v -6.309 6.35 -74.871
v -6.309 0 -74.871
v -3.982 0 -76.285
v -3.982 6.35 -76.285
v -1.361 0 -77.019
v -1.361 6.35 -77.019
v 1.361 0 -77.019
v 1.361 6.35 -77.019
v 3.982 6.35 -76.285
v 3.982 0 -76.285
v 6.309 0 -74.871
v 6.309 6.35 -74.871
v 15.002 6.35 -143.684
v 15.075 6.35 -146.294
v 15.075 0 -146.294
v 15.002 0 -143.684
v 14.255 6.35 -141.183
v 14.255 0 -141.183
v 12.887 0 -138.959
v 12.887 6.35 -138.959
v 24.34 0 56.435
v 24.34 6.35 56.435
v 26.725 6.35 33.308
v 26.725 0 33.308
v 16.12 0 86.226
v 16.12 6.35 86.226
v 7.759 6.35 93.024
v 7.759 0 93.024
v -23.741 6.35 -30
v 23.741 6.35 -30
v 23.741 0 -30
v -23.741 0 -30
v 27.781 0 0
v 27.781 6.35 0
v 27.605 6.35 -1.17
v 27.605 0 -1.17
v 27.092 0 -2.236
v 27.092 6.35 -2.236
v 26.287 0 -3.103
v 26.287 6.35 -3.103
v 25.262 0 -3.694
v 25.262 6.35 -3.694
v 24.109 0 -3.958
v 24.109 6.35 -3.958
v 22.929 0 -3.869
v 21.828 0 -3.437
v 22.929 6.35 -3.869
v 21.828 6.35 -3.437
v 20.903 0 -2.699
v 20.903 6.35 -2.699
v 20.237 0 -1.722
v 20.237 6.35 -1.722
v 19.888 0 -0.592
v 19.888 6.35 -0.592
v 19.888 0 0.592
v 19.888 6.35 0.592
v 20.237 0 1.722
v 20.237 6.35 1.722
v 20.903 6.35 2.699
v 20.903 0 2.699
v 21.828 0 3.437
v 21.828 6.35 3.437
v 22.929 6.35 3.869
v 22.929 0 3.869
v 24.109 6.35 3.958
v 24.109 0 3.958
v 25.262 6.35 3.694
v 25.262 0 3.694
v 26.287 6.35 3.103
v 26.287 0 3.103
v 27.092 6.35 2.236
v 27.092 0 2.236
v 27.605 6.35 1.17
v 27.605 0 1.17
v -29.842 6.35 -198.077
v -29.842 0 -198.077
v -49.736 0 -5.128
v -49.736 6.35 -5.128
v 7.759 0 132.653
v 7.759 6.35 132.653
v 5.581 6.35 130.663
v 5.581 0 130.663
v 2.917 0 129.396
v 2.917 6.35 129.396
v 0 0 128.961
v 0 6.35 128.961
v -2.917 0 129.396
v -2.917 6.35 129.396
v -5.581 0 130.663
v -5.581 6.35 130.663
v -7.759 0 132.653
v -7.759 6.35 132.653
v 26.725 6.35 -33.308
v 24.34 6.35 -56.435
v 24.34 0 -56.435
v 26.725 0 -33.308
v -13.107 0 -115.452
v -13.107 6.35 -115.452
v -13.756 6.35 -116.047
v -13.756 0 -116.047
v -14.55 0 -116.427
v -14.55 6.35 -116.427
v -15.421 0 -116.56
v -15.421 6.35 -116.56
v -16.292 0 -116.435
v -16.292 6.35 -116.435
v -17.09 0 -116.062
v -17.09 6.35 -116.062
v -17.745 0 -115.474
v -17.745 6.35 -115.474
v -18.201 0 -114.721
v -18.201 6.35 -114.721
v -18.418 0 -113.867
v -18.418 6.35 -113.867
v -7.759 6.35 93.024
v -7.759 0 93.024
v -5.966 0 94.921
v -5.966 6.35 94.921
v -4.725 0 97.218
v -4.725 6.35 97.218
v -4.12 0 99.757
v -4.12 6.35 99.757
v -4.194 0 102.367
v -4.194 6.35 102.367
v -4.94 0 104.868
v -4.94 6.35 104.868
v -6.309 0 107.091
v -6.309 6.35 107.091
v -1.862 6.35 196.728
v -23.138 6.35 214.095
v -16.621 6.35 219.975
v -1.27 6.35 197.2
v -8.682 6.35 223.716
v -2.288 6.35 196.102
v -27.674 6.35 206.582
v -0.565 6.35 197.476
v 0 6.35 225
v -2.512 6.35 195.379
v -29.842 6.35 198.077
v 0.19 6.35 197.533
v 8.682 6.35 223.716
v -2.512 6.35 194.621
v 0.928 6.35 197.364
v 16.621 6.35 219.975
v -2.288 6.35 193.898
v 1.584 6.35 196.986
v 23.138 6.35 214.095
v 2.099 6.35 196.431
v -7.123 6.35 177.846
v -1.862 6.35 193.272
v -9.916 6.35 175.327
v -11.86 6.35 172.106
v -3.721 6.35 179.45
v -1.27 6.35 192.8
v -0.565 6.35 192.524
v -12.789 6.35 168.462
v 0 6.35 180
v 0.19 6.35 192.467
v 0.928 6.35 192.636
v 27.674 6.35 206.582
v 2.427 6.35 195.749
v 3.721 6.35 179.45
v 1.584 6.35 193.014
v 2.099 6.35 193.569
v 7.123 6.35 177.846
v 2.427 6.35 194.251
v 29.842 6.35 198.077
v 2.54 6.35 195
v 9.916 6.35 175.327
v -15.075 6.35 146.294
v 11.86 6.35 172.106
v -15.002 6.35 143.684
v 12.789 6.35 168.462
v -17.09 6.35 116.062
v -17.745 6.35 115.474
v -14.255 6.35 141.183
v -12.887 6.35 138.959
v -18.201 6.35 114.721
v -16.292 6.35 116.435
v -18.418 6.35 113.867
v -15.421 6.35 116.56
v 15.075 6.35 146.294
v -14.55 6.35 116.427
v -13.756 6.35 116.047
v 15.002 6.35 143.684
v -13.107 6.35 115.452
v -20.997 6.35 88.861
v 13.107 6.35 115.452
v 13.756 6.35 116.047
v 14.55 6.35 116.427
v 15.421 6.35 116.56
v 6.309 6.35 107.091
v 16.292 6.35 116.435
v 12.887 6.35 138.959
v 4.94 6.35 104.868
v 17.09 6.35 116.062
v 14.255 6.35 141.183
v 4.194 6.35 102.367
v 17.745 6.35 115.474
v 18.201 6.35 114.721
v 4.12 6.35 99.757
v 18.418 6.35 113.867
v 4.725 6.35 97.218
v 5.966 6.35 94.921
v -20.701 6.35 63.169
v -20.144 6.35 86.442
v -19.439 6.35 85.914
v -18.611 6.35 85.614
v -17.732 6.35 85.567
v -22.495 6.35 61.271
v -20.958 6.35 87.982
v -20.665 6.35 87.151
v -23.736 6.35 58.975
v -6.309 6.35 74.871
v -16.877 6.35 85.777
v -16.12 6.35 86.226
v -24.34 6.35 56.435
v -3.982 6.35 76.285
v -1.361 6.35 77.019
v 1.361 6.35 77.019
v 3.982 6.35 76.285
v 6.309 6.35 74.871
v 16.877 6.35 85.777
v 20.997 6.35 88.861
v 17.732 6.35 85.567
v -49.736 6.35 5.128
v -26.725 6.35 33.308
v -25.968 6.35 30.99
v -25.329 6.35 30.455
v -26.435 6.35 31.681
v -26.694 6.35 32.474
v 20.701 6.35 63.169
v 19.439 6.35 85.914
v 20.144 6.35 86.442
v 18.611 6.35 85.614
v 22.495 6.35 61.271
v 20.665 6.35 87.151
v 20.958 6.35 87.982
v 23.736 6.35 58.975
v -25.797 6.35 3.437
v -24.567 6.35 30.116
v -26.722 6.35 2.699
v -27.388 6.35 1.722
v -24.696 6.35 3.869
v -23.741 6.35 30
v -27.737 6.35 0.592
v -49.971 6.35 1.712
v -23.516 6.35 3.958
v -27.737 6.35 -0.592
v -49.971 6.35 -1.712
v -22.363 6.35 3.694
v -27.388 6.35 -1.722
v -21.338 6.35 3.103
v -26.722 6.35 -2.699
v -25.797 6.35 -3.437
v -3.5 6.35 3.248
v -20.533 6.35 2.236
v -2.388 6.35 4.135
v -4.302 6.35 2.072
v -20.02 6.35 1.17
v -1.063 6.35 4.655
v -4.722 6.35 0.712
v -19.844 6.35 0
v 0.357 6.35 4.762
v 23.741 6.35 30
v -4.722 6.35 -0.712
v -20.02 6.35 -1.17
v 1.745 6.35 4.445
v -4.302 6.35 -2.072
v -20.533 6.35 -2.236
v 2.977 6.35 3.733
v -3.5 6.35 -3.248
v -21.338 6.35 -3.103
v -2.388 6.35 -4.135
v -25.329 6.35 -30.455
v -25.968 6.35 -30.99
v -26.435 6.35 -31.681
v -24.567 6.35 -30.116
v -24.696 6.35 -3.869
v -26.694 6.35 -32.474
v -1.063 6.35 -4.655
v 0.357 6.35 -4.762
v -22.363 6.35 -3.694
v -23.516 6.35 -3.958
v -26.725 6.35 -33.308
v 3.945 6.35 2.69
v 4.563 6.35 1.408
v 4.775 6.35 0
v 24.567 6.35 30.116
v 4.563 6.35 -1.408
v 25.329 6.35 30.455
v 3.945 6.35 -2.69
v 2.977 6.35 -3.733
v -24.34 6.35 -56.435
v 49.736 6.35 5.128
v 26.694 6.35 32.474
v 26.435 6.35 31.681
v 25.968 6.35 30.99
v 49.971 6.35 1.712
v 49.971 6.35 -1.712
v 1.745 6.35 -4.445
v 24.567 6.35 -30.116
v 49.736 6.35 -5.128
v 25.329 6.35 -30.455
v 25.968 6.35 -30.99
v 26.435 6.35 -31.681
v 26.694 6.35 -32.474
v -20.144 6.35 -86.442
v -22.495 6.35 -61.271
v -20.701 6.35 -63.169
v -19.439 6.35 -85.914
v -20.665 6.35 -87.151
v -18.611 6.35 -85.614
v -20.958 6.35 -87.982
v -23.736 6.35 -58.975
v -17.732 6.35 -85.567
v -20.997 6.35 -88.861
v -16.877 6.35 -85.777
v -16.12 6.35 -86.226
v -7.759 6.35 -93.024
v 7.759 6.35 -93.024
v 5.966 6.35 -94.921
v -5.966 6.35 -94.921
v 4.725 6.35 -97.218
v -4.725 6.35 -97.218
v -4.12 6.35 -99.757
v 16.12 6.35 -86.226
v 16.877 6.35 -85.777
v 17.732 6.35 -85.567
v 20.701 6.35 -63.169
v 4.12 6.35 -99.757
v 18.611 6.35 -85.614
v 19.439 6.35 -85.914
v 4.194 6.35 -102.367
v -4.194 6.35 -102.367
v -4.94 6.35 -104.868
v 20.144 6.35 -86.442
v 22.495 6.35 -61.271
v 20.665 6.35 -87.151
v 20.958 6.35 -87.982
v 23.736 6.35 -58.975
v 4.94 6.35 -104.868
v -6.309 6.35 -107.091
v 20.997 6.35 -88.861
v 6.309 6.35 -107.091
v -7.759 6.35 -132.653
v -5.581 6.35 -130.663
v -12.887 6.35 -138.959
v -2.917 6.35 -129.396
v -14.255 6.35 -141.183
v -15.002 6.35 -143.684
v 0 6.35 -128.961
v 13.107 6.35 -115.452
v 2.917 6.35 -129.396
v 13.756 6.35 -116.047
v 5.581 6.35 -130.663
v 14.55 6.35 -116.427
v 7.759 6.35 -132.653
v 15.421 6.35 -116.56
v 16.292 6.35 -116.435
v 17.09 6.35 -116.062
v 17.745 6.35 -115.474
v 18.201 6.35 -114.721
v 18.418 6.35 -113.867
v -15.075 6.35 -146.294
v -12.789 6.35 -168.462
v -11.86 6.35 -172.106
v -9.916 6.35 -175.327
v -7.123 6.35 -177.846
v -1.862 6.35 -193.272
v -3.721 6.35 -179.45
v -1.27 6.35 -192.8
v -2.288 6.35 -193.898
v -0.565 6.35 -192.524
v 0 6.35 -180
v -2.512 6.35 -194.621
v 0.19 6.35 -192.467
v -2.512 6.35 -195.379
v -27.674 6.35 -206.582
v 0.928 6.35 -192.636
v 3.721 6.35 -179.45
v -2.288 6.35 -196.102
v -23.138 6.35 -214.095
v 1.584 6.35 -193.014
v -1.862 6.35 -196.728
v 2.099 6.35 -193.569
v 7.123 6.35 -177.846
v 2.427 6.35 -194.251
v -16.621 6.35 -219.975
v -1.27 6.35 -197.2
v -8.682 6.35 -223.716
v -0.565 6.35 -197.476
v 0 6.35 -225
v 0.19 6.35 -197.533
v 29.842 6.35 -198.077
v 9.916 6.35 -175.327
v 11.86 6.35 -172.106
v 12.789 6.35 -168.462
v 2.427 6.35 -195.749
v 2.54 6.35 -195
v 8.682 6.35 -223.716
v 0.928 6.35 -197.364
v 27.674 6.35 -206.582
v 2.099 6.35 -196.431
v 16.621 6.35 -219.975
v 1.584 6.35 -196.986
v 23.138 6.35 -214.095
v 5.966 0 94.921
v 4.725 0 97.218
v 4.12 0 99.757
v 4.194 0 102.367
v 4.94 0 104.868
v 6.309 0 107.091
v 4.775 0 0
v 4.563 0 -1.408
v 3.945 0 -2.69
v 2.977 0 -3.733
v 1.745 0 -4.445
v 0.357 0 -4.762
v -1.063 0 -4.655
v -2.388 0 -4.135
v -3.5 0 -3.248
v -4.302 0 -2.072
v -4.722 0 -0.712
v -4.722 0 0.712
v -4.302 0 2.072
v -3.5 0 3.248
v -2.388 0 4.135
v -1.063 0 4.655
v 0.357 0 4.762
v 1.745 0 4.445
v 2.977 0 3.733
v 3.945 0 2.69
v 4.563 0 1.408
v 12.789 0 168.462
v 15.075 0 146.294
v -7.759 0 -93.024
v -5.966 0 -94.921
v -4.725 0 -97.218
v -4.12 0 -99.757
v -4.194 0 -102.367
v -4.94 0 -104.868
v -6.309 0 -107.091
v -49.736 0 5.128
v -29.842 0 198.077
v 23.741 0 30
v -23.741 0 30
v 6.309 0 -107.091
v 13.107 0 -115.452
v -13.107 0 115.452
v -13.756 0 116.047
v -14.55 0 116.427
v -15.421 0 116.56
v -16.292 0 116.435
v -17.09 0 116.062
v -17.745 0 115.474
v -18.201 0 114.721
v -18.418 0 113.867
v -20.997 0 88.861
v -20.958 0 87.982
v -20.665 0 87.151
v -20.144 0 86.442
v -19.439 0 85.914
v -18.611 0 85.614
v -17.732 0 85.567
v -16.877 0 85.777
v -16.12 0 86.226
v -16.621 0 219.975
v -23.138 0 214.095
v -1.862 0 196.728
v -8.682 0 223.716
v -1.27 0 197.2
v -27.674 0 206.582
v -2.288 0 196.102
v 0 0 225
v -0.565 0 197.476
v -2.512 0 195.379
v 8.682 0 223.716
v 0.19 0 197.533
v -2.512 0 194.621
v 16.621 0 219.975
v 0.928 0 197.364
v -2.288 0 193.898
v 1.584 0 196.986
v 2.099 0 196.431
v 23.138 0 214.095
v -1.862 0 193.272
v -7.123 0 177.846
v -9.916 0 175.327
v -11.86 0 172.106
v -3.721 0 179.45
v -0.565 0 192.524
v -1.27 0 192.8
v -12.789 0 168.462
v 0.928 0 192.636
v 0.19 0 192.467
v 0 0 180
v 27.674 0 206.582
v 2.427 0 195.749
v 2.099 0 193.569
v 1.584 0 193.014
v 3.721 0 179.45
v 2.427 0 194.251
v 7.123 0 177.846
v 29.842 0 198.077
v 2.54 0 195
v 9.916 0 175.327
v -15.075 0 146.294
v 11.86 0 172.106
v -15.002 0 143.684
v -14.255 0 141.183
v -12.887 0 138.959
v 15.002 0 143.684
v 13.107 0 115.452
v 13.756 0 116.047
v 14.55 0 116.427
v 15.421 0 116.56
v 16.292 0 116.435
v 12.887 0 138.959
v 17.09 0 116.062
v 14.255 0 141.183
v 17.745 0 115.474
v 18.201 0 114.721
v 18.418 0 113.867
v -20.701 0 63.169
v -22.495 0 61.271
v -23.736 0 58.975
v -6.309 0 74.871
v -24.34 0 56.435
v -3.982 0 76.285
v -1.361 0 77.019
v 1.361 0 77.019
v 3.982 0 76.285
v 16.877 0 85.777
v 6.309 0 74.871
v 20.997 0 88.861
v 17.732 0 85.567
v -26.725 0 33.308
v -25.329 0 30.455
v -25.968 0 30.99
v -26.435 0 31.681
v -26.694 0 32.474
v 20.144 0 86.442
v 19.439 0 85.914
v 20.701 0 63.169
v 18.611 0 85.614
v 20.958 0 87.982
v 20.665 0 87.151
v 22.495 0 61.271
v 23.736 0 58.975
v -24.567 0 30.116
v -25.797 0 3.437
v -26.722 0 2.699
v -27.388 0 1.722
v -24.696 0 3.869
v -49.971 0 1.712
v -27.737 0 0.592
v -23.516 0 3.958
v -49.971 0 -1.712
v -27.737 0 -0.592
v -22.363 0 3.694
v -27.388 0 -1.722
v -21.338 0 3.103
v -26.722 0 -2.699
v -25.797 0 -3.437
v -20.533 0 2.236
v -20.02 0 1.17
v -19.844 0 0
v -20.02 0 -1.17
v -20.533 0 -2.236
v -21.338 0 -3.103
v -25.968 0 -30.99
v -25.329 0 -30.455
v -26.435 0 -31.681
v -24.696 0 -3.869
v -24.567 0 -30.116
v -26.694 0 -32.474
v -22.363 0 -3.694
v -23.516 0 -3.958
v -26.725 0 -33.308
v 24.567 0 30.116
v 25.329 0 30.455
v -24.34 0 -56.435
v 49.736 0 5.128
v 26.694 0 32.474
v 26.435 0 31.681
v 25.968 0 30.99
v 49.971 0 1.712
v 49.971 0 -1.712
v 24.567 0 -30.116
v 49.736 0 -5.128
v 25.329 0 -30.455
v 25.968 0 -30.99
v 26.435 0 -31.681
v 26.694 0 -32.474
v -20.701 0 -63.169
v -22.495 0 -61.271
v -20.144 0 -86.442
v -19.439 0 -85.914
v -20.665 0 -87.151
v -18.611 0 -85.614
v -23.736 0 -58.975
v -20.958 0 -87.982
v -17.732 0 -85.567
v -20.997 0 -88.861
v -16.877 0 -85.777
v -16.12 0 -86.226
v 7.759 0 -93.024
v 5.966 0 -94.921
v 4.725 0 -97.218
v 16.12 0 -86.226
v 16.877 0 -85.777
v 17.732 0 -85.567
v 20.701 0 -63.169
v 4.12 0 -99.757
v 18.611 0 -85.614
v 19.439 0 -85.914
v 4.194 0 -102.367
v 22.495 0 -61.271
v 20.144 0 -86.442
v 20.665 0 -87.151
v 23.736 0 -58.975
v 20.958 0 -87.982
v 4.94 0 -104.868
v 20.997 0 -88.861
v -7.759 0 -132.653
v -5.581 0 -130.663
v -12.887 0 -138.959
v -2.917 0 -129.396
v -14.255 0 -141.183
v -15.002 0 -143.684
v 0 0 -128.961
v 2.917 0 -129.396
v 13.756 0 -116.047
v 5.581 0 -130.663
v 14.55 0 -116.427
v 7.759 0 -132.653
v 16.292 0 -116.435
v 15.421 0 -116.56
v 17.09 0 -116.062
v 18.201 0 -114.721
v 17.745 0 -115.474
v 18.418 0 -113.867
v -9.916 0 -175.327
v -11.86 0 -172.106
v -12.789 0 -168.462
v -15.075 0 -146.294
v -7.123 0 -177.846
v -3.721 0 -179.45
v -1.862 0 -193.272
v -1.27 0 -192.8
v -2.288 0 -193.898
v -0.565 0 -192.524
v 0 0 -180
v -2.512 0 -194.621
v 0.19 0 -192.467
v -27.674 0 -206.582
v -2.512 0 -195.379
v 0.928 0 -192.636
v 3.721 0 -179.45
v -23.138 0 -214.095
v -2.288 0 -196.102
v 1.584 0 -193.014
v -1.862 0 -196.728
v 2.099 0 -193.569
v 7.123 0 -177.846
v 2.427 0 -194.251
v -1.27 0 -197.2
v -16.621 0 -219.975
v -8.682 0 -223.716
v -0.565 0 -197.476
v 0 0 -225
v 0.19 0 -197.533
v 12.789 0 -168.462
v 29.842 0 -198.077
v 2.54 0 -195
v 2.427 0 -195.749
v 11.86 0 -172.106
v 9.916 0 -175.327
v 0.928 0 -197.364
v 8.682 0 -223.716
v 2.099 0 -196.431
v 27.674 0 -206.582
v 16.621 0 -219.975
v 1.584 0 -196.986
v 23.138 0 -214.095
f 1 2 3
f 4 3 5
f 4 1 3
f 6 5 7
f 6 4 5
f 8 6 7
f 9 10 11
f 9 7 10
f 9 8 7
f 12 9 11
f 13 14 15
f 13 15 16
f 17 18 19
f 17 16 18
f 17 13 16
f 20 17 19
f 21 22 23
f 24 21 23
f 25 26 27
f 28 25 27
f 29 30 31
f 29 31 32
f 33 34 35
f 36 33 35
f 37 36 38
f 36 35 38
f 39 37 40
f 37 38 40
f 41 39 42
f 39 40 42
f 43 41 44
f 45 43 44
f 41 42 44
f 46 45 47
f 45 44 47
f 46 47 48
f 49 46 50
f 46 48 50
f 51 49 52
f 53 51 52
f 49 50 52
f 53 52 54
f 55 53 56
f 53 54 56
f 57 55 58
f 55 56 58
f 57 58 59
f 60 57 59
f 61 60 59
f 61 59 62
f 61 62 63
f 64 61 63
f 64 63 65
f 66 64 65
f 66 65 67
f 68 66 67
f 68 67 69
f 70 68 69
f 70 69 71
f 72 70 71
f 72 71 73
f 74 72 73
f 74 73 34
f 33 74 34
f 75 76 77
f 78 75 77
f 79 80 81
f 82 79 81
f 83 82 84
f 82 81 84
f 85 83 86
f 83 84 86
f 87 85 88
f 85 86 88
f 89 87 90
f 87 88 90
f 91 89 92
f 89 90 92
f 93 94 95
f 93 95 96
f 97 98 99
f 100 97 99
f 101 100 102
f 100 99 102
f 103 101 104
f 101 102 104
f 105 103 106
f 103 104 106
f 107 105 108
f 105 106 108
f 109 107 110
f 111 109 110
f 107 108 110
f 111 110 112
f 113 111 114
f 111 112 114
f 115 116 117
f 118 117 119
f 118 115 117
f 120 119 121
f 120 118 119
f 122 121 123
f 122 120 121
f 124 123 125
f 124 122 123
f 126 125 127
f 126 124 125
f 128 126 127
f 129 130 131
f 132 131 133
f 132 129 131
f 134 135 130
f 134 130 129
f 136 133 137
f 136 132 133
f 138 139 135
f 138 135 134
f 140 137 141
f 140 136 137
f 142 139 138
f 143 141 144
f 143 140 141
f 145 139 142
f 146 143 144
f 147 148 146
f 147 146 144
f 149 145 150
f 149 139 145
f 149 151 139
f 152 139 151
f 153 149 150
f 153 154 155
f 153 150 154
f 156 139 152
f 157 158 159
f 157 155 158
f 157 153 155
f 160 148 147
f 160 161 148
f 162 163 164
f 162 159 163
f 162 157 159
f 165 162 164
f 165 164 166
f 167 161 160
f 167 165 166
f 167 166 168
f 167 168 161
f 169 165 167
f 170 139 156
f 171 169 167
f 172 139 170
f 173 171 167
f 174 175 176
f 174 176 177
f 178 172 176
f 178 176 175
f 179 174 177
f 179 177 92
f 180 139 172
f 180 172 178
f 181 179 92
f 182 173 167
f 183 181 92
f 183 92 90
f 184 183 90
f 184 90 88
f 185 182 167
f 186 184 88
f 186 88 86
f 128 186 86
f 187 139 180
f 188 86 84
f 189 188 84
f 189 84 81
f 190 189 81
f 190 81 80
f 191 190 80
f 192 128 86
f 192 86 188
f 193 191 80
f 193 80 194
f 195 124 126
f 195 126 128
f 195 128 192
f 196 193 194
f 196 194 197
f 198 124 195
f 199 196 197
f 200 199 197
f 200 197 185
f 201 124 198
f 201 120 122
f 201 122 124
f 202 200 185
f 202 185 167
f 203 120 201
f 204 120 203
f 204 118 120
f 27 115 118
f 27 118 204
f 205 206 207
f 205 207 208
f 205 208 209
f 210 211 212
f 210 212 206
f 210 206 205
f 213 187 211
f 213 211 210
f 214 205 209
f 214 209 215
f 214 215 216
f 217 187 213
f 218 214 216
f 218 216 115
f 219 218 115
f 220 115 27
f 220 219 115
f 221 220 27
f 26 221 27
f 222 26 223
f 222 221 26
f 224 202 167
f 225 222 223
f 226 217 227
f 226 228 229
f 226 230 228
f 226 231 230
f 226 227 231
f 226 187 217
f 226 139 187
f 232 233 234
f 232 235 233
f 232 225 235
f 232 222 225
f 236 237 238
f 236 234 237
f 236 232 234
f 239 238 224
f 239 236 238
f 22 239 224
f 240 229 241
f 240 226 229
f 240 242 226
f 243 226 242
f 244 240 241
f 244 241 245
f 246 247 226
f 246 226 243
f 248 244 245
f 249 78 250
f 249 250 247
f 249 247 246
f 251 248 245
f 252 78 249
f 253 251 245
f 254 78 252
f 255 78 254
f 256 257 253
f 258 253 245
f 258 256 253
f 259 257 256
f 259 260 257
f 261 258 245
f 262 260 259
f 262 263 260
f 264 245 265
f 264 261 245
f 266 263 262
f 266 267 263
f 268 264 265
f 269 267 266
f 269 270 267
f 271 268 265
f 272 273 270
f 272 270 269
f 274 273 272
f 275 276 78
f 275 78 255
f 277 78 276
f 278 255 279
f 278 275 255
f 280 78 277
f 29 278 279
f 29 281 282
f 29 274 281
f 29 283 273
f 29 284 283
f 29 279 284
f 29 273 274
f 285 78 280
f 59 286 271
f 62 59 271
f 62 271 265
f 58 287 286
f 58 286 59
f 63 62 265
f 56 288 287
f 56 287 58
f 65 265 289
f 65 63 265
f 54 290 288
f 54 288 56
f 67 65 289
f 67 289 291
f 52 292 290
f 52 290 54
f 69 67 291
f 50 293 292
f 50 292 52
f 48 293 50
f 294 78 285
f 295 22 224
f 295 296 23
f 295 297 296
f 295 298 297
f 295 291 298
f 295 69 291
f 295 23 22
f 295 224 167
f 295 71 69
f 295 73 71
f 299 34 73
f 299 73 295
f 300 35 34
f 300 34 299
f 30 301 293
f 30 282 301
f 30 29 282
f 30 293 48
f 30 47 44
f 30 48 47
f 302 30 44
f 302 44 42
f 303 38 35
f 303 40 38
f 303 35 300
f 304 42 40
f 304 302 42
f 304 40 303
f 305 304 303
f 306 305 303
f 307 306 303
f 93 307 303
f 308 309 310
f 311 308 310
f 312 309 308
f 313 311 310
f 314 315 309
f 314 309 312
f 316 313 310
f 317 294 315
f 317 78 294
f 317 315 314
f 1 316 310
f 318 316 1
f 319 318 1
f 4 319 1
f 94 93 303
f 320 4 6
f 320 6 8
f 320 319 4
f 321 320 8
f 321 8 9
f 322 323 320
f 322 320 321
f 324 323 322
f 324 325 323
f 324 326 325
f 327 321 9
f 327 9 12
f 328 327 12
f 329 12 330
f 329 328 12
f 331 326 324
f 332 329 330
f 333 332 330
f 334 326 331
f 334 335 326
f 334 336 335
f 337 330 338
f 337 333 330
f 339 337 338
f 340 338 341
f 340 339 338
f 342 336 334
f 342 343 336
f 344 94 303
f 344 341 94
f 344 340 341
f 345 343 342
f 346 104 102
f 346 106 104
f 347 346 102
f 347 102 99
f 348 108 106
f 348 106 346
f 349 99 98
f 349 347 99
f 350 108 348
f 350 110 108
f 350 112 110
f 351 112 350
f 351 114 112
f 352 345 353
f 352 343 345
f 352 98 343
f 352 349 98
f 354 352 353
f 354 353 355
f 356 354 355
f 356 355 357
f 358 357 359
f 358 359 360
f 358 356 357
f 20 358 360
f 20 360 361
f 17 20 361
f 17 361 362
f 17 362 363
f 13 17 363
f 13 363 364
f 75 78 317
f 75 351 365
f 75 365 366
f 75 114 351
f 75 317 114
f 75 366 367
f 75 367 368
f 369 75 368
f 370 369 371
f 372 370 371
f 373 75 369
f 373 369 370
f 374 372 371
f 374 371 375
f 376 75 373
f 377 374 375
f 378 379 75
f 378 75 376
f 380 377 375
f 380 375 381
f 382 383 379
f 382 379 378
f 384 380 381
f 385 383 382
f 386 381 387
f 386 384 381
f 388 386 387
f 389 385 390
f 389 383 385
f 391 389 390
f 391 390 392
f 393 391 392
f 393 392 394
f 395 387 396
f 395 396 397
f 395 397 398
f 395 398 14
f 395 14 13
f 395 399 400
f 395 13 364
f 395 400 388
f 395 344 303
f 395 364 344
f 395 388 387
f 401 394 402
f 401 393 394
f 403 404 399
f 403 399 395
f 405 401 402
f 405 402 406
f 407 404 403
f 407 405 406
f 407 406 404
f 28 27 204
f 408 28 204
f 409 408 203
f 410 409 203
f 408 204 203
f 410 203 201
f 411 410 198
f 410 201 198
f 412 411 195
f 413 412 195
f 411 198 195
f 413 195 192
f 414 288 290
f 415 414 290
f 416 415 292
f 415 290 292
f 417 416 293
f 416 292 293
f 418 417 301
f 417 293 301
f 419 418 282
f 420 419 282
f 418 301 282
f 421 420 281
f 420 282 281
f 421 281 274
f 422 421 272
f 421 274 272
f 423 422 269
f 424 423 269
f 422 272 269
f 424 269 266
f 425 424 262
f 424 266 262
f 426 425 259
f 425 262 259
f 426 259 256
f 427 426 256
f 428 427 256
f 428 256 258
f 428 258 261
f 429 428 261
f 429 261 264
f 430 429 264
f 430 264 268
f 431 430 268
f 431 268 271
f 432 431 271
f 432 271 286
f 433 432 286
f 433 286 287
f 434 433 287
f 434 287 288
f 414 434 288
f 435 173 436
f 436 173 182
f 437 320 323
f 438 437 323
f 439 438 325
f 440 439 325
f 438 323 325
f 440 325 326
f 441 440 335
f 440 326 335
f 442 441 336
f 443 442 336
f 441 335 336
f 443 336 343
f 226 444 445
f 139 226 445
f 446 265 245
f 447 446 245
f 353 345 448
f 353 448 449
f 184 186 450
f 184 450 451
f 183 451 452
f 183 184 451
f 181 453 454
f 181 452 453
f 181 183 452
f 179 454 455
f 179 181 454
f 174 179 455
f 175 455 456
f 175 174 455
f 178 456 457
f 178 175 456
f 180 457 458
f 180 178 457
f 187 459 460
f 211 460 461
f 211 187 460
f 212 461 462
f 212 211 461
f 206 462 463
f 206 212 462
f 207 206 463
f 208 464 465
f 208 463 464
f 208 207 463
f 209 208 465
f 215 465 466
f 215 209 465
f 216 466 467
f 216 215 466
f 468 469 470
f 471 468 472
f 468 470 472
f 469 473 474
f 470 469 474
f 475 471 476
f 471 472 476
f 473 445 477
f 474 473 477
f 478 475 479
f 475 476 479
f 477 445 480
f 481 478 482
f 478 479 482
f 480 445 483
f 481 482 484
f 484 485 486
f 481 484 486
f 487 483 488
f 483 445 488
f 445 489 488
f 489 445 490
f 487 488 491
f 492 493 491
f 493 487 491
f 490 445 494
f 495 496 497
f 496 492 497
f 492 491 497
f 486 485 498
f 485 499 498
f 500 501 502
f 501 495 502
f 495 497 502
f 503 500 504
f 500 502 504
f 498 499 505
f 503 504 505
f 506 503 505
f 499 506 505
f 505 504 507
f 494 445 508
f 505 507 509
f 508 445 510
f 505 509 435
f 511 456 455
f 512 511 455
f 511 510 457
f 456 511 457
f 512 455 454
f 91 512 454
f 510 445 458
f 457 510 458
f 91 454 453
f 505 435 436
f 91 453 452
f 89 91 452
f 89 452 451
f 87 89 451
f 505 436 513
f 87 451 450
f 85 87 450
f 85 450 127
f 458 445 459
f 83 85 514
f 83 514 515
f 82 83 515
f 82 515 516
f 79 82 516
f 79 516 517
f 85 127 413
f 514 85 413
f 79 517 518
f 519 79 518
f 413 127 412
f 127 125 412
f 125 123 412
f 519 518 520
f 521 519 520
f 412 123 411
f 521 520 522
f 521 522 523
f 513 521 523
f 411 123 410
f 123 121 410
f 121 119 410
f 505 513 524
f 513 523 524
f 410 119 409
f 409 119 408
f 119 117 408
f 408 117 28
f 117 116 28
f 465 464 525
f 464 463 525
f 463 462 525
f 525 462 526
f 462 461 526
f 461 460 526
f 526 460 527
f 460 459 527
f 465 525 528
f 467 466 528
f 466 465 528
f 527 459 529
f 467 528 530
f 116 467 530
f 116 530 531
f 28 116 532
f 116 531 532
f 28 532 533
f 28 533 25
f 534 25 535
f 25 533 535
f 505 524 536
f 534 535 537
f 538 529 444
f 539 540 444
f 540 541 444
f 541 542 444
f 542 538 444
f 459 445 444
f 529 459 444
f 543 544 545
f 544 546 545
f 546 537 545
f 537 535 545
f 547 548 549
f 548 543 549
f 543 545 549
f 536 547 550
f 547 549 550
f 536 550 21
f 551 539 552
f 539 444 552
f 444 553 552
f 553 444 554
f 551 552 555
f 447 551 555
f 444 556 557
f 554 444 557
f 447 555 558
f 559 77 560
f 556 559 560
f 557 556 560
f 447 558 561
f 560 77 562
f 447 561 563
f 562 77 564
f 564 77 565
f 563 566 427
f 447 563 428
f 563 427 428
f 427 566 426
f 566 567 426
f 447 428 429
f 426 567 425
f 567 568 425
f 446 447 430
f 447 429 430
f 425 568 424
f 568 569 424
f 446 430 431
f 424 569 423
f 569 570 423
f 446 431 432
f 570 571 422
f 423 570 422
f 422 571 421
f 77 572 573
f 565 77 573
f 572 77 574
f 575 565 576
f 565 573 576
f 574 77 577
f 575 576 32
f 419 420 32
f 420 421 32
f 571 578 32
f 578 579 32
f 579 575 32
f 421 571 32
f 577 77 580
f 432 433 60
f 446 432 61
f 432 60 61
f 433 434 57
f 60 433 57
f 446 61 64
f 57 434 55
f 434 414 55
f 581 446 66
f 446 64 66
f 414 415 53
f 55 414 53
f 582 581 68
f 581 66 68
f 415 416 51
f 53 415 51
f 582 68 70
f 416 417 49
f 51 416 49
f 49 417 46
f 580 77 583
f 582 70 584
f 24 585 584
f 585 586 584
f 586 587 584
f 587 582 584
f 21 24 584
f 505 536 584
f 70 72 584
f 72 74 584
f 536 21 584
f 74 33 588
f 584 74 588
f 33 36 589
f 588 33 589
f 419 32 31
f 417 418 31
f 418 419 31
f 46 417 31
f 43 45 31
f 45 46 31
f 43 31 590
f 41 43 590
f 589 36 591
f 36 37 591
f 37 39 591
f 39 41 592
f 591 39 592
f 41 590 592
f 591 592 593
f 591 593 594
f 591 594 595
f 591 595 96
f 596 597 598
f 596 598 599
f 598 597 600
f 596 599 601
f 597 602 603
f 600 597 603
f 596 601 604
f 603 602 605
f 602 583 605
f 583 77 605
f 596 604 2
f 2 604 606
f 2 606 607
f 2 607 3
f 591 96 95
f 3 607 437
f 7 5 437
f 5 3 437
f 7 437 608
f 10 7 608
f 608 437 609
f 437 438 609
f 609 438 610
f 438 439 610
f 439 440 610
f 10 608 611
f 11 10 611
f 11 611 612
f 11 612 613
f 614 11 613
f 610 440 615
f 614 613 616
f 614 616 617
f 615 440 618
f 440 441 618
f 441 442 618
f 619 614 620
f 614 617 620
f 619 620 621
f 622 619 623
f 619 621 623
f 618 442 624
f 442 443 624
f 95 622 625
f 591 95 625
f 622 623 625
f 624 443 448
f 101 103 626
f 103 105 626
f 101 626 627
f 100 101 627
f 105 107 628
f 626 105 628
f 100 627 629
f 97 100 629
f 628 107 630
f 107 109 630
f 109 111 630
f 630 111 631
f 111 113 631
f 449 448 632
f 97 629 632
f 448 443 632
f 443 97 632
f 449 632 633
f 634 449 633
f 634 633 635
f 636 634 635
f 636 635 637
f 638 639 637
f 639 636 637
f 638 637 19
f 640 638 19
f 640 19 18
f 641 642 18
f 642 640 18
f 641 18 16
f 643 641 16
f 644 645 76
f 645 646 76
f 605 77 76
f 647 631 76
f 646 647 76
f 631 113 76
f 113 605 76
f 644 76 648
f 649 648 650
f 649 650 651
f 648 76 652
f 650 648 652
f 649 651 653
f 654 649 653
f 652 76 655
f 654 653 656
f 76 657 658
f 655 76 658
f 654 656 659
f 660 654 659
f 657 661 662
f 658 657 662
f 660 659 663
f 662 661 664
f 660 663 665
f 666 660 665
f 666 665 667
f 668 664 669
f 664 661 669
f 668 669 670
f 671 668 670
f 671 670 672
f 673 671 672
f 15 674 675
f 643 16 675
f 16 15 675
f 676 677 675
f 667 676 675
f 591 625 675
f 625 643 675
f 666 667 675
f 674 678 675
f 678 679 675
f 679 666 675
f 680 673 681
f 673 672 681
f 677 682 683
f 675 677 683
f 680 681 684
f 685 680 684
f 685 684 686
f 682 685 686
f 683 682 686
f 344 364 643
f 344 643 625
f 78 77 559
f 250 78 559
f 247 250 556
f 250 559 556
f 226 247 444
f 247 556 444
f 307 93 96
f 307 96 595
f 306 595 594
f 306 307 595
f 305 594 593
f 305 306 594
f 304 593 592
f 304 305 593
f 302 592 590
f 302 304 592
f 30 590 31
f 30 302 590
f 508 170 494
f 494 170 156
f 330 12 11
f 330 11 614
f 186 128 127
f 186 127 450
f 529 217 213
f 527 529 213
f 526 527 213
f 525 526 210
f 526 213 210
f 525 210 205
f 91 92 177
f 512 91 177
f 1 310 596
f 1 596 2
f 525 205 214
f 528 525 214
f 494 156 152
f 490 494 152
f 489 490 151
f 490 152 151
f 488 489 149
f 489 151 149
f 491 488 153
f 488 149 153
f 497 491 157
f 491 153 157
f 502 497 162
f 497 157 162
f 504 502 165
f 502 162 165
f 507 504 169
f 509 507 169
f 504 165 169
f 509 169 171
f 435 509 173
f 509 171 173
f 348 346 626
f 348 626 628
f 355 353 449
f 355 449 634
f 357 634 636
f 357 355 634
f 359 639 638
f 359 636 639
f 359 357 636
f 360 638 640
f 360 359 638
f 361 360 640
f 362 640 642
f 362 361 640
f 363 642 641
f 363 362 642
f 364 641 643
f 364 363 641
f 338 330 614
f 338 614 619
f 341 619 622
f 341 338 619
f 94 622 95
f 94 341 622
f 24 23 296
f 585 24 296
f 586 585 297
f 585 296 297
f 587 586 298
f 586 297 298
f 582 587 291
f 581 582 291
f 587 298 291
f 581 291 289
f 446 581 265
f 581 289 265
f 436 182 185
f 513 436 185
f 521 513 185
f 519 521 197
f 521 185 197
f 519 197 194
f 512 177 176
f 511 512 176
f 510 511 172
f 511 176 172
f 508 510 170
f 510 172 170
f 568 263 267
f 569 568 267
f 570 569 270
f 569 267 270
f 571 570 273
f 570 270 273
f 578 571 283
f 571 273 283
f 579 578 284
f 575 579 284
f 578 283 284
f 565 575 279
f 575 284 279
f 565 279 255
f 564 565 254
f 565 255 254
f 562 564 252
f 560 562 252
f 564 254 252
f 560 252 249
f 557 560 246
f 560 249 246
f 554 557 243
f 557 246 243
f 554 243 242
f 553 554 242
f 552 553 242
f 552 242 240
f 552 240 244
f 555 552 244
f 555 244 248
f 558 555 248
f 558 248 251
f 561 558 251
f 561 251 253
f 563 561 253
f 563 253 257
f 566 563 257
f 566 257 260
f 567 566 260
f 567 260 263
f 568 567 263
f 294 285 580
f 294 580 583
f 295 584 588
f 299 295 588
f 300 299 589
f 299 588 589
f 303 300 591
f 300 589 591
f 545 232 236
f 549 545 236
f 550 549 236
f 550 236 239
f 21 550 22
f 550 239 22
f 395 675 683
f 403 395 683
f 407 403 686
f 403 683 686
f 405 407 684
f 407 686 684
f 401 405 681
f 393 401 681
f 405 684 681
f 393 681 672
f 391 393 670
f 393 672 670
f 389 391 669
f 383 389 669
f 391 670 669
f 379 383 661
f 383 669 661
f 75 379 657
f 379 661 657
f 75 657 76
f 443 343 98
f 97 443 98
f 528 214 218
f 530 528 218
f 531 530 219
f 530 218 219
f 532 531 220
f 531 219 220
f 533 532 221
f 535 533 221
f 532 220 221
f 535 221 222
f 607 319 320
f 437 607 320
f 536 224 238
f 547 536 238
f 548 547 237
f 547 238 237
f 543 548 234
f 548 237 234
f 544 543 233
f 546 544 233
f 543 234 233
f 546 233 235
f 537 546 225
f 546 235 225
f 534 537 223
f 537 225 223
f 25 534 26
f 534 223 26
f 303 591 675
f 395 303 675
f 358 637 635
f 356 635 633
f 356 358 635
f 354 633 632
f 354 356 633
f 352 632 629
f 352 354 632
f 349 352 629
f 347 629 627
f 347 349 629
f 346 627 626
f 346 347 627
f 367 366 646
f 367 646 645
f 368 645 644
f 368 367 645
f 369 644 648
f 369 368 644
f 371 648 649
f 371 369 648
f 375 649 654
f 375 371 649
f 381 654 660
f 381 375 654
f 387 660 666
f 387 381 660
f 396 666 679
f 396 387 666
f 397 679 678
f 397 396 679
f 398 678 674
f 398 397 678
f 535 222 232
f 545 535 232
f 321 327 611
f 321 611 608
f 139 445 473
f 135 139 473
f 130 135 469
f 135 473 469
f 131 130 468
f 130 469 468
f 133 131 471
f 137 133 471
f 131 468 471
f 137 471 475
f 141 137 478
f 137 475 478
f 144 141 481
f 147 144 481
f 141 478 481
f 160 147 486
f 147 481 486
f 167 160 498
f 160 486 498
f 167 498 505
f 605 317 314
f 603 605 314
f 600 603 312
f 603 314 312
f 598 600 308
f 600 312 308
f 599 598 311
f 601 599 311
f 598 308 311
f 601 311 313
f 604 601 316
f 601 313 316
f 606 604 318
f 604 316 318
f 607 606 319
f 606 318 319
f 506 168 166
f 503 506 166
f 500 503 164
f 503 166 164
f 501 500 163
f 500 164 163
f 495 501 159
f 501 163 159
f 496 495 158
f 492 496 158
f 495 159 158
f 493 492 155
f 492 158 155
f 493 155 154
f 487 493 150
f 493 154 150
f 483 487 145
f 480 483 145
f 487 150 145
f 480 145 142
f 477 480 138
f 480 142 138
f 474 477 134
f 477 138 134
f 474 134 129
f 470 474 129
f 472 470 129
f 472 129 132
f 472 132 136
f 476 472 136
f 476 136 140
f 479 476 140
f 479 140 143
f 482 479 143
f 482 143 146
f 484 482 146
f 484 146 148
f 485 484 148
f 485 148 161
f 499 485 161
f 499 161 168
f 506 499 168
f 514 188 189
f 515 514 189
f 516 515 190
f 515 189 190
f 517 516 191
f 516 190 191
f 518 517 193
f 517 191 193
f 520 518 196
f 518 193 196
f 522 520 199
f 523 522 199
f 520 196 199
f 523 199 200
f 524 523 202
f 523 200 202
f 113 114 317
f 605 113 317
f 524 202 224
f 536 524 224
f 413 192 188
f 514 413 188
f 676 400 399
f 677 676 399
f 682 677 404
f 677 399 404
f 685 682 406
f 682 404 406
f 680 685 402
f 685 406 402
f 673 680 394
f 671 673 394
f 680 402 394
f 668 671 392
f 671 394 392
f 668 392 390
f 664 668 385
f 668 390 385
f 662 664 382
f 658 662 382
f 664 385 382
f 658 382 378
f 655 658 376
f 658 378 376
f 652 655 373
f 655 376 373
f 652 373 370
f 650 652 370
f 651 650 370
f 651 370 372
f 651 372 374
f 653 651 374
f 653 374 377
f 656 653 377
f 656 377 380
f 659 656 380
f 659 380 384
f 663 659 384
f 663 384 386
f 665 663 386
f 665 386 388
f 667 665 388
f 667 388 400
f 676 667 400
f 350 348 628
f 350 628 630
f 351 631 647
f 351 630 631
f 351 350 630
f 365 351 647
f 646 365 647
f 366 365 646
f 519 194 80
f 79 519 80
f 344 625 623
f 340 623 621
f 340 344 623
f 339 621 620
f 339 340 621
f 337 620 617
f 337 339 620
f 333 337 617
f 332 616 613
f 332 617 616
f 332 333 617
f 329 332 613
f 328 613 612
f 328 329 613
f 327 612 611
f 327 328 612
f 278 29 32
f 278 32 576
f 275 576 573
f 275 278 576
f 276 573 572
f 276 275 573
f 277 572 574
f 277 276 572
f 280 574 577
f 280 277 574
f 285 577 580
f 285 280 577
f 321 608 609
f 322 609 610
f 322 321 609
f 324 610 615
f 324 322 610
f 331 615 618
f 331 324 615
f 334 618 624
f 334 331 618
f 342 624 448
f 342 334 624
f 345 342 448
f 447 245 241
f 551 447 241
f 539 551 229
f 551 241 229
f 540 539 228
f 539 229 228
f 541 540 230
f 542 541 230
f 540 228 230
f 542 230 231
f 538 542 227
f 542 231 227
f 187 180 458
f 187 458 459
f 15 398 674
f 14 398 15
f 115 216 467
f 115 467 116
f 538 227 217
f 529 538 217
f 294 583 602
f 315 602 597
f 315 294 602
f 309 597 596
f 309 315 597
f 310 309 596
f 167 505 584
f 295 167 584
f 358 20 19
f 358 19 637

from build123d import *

# Parameters (mm, degrees)
BASE_DEPTH         = 6.35
SKETCH2_R          = 4.7752
SKETCH2_R_2        = 2.54
SKETCH2_R_3        = 3.96875
BOLTS_DEPTH        = 7.35
CUT_EXTRUDE1_DEPTH = 7.35


with BuildPart() as part:
    # Sketch1 → Base (new body)
    with BuildSketch(Plane(origin=(0, 0, 0), x_dir=(1, 0, 0), z_dir=(0, 1, 0))):
        with BuildLine():
            Line((-29.84179191, 198.076923077), (-49.736319849, 5.128205128))
            ThreePointArc((-49.736319849, 5.128205128), (-50, 0), (-49.736319849, -5.128205128))
            Line((-49.736319849, -5.128205128), (-29.84179191, -198.076923077))
            ThreePointArc((-29.84179191, -198.076923077), (0, -225), (29.84179191, -198.076923077))
            Line((29.84179191, -198.076923077), (49.736319849, -5.128205128))
            ThreePointArc((49.736319849, -5.128205128), (50, 0), (49.736319849, 5.128205128))
            Line((49.736319849, 5.128205128), (29.84179191, 198.076923077))
            ThreePointArc((29.84179191, 198.076923077), (0, 225), (-29.84179191, 198.076923077))
        make_face()
    extrude(amount=BASE_DEPTH)

    # Sketch2 → Bolts (cut, through all)
    with BuildSketch(Plane(origin=(0, 6.35, 0), x_dir=(1, 0, 0), z_dir=(0, 1, 0))):
        Circle(SKETCH2_R)
        with Locations((0, 195)):
            Circle(SKETCH2_R_2)
        with Locations((-23.8125, 0)):
            Circle(SKETCH2_R_3)
        with Locations((23.8125, 0)):
            Circle(SKETCH2_R_3)
        with Locations((0, -195)):
            Circle(SKETCH2_R_2)
    extrude(amount=-BOLTS_DEPTH, mode=Mode.SUBTRACT)

    # Sketch4 → Cut-Extrude1 (cut, through all)
    with BuildSketch(Plane(origin=(0, 6.35, 0), x_dir=(1, 0, 0), z_dir=(0, 1, 0))):
        with BuildLine():
            Line((-26.724762216, -33.307692308), (-24.340140182, -56.435145528))
            ThreePointArc((-24.340140182, -56.435145528), (-23.190453971, -60.163726372), (-20.701416296, -63.168520034))
            Line((-20.701416296, -63.168520034), (-6.308540083, -74.870782535))
            ThreePointArc((-6.308540083, -74.870782535), (0, -77.111767003), (6.308540083, -74.870782535))
            Line((6.308540083, -74.870782535), (20.701416296, -63.168520034))
            ThreePointArc((20.701416296, -63.168520034), (23.190453971, -60.163726372), (24.340140182, -56.435145528))
            Line((24.340140182, -56.435145528), (26.724762216, -33.307692308))
            ThreePointArc((26.724762216, -33.307692308), (25.968034139, -30.990407619), (23.740583026, -30))
            Line((23.740583026, -30), (-23.740583026, -30))
            ThreePointArc((-23.740583026, -30), (-25.968034139, -30.990407619), (-26.724762216, -33.307692308))
        make_face()
        with BuildLine():
            Line((16.120016428, -86.225819503), (7.759015532, -93.023809413))
            ThreePointArc((7.759015532, -93.023809413), (4.120291645, -99.757183919), (6.308540083, -107.091365027))
            Line((6.308540083, -107.091365027), (13.106529993, -115.452365924))
            ThreePointArc((13.106529993, -115.452365924), (16.291959962, -116.434574723), (18.418413843, -113.867496207))
            Line((18.418413843, -113.867496207), (20.996757644, -88.86121647))
            ThreePointArc((20.996757644, -88.86121647), (19.438845014, -85.914250835), (16.120016428, -86.225819503))
        make_face()
        with BuildLine():
            Line((-6.308540083, -107.091365027), (-13.106529993, -115.452365924))
            ThreePointArc((-13.106529993, -115.452365924), (-16.291959962, -116.434574723), (-18.418413843, -113.867496207))
            Line((-18.418413843, -113.867496207), (-20.996757644, -88.86121647))
            ThreePointArc((-20.996757644, -88.86121647), (-19.438845014, -85.914250835), (-16.120016428, -86.225819503))
            Line((-16.120016428, -86.225819503), (-7.759015532, -93.023809413))
            ThreePointArc((-7.759015532, -93.023809413), (-4.120291645, -99.757183919), (-6.308540083, -107.091365027))
        make_face()
        with BuildLine():
            Line((-7.759015532, -132.652629505), (-12.886782867, -138.95938604))
            ThreePointArc((-12.886782867, -138.95938604), (-14.710336749, -142.408841756), (-15.075031305, -146.293567149))
            Line((-15.075031305, -146.293567149), (-12.78933939, -168.461538462))
            ThreePointArc((-12.78933939, -168.461538462), (0, -180), (12.78933939, -168.461538462))
            Line((12.78933939, -168.461538462), (15.075031305, -146.293567149))
            ThreePointArc((15.075031305, -146.293567149), (14.710336749, -142.408841756), (12.886782867, -138.95938604))
            Line((12.886782867, -138.95938604), (7.759015532, -132.652629505))
            ThreePointArc((7.759015532, -132.652629505), (0, -128.961169588), (-7.759015532, -132.652629505))
        make_face()
        with BuildLine():
            Line((24.340140182, 56.435145528), (26.724762216, 33.307692308))
            ThreePointArc((26.724762216, 33.307692308), (25.968034139, 30.990407619), (23.740583026, 30))
            Line((23.740583026, 30), (-23.740583026, 30))
            ThreePointArc((-23.740583026, 30), (-25.968034139, 30.990407619), (-26.724762216, 33.307692308))
            Line((-26.724762216, 33.307692308), (-24.340140182, 56.435145528))
            ThreePointArc((-24.340140182, 56.435145528), (-23.190453971, 60.163726372), (-20.701416296, 63.168520034))
            Line((-20.701416296, 63.168520034), (-6.308540083, 74.870782535))
            ThreePointArc((-6.308540083, 74.870782535), (0, 77.111767003), (6.308540083, 74.870782535))
            Line((6.308540083, 74.870782535), (20.701416296, 63.168520034))
            ThreePointArc((20.701416296, 63.168520034), (23.190453971, 60.163726372), (24.340140182, 56.435145528))
        make_face()
        with BuildLine():
            Line((-16.120016428, 86.225819503), (-7.759015532, 93.023809413))
            ThreePointArc((-7.759015532, 93.023809413), (-4.120291645, 99.757183919), (-6.308540083, 107.091365027))
            Line((-6.308540083, 107.091365027), (-13.106529993, 115.452365924))
            ThreePointArc((-13.106529993, 115.452365924), (-16.291959962, 116.434574723), (-18.418413843, 113.867496207))
            Line((-18.418413843, 113.867496207), (-20.996757644, 88.86121647))
            ThreePointArc((-20.996757644, 88.86121647), (-19.438845014, 85.914250835), (-16.120016428, 86.225819503))
        make_face()
        with BuildLine():
            Line((6.308540083, 107.091365027), (13.106529993, 115.452365924))
            ThreePointArc((13.106529993, 115.452365924), (16.291959962, 116.434574723), (18.418413843, 113.867496207))
            Line((18.418413843, 113.867496207), (20.996757644, 88.86121647))
            ThreePointArc((20.996757644, 88.86121647), (19.438845014, 85.914250835), (16.120016428, 86.225819503))
            Line((16.120016428, 86.225819503), (7.759015532, 93.023809413))
            ThreePointArc((7.759015532, 93.023809413), (4.120291645, 99.757183919), (6.308540083, 107.091365027))
        make_face()
        with BuildLine():
            Line((12.78933939, 168.461538462), (15.075031305, 146.293567149))
            ThreePointArc((15.075031305, 146.293567149), (14.710336749, 142.408841756), (12.886782867, 138.95938604))
            Line((12.886782867, 138.95938604), (7.759015532, 132.652629505))
            ThreePointArc((7.759015532, 132.652629505), (0, 128.961169588), (-7.759015532, 132.652629505))
            Line((-7.759015532, 132.652629505), (-12.886782867, 138.95938604))
            ThreePointArc((-12.886782867, 138.95938604), (-14.710336749, 142.408841756), (-15.075031305, 146.293567149))
            Line((-15.075031305, 146.293567149), (-12.78933939, 168.461538462))
            ThreePointArc((-12.78933939, 168.461538462), (0, 180), (12.78933939, 168.461538462))
        make_face()
    extrude(amount=-CUT_EXTRUDE1_DEPTH, mode=Mode.SUBTRACT)


solid = part.part
